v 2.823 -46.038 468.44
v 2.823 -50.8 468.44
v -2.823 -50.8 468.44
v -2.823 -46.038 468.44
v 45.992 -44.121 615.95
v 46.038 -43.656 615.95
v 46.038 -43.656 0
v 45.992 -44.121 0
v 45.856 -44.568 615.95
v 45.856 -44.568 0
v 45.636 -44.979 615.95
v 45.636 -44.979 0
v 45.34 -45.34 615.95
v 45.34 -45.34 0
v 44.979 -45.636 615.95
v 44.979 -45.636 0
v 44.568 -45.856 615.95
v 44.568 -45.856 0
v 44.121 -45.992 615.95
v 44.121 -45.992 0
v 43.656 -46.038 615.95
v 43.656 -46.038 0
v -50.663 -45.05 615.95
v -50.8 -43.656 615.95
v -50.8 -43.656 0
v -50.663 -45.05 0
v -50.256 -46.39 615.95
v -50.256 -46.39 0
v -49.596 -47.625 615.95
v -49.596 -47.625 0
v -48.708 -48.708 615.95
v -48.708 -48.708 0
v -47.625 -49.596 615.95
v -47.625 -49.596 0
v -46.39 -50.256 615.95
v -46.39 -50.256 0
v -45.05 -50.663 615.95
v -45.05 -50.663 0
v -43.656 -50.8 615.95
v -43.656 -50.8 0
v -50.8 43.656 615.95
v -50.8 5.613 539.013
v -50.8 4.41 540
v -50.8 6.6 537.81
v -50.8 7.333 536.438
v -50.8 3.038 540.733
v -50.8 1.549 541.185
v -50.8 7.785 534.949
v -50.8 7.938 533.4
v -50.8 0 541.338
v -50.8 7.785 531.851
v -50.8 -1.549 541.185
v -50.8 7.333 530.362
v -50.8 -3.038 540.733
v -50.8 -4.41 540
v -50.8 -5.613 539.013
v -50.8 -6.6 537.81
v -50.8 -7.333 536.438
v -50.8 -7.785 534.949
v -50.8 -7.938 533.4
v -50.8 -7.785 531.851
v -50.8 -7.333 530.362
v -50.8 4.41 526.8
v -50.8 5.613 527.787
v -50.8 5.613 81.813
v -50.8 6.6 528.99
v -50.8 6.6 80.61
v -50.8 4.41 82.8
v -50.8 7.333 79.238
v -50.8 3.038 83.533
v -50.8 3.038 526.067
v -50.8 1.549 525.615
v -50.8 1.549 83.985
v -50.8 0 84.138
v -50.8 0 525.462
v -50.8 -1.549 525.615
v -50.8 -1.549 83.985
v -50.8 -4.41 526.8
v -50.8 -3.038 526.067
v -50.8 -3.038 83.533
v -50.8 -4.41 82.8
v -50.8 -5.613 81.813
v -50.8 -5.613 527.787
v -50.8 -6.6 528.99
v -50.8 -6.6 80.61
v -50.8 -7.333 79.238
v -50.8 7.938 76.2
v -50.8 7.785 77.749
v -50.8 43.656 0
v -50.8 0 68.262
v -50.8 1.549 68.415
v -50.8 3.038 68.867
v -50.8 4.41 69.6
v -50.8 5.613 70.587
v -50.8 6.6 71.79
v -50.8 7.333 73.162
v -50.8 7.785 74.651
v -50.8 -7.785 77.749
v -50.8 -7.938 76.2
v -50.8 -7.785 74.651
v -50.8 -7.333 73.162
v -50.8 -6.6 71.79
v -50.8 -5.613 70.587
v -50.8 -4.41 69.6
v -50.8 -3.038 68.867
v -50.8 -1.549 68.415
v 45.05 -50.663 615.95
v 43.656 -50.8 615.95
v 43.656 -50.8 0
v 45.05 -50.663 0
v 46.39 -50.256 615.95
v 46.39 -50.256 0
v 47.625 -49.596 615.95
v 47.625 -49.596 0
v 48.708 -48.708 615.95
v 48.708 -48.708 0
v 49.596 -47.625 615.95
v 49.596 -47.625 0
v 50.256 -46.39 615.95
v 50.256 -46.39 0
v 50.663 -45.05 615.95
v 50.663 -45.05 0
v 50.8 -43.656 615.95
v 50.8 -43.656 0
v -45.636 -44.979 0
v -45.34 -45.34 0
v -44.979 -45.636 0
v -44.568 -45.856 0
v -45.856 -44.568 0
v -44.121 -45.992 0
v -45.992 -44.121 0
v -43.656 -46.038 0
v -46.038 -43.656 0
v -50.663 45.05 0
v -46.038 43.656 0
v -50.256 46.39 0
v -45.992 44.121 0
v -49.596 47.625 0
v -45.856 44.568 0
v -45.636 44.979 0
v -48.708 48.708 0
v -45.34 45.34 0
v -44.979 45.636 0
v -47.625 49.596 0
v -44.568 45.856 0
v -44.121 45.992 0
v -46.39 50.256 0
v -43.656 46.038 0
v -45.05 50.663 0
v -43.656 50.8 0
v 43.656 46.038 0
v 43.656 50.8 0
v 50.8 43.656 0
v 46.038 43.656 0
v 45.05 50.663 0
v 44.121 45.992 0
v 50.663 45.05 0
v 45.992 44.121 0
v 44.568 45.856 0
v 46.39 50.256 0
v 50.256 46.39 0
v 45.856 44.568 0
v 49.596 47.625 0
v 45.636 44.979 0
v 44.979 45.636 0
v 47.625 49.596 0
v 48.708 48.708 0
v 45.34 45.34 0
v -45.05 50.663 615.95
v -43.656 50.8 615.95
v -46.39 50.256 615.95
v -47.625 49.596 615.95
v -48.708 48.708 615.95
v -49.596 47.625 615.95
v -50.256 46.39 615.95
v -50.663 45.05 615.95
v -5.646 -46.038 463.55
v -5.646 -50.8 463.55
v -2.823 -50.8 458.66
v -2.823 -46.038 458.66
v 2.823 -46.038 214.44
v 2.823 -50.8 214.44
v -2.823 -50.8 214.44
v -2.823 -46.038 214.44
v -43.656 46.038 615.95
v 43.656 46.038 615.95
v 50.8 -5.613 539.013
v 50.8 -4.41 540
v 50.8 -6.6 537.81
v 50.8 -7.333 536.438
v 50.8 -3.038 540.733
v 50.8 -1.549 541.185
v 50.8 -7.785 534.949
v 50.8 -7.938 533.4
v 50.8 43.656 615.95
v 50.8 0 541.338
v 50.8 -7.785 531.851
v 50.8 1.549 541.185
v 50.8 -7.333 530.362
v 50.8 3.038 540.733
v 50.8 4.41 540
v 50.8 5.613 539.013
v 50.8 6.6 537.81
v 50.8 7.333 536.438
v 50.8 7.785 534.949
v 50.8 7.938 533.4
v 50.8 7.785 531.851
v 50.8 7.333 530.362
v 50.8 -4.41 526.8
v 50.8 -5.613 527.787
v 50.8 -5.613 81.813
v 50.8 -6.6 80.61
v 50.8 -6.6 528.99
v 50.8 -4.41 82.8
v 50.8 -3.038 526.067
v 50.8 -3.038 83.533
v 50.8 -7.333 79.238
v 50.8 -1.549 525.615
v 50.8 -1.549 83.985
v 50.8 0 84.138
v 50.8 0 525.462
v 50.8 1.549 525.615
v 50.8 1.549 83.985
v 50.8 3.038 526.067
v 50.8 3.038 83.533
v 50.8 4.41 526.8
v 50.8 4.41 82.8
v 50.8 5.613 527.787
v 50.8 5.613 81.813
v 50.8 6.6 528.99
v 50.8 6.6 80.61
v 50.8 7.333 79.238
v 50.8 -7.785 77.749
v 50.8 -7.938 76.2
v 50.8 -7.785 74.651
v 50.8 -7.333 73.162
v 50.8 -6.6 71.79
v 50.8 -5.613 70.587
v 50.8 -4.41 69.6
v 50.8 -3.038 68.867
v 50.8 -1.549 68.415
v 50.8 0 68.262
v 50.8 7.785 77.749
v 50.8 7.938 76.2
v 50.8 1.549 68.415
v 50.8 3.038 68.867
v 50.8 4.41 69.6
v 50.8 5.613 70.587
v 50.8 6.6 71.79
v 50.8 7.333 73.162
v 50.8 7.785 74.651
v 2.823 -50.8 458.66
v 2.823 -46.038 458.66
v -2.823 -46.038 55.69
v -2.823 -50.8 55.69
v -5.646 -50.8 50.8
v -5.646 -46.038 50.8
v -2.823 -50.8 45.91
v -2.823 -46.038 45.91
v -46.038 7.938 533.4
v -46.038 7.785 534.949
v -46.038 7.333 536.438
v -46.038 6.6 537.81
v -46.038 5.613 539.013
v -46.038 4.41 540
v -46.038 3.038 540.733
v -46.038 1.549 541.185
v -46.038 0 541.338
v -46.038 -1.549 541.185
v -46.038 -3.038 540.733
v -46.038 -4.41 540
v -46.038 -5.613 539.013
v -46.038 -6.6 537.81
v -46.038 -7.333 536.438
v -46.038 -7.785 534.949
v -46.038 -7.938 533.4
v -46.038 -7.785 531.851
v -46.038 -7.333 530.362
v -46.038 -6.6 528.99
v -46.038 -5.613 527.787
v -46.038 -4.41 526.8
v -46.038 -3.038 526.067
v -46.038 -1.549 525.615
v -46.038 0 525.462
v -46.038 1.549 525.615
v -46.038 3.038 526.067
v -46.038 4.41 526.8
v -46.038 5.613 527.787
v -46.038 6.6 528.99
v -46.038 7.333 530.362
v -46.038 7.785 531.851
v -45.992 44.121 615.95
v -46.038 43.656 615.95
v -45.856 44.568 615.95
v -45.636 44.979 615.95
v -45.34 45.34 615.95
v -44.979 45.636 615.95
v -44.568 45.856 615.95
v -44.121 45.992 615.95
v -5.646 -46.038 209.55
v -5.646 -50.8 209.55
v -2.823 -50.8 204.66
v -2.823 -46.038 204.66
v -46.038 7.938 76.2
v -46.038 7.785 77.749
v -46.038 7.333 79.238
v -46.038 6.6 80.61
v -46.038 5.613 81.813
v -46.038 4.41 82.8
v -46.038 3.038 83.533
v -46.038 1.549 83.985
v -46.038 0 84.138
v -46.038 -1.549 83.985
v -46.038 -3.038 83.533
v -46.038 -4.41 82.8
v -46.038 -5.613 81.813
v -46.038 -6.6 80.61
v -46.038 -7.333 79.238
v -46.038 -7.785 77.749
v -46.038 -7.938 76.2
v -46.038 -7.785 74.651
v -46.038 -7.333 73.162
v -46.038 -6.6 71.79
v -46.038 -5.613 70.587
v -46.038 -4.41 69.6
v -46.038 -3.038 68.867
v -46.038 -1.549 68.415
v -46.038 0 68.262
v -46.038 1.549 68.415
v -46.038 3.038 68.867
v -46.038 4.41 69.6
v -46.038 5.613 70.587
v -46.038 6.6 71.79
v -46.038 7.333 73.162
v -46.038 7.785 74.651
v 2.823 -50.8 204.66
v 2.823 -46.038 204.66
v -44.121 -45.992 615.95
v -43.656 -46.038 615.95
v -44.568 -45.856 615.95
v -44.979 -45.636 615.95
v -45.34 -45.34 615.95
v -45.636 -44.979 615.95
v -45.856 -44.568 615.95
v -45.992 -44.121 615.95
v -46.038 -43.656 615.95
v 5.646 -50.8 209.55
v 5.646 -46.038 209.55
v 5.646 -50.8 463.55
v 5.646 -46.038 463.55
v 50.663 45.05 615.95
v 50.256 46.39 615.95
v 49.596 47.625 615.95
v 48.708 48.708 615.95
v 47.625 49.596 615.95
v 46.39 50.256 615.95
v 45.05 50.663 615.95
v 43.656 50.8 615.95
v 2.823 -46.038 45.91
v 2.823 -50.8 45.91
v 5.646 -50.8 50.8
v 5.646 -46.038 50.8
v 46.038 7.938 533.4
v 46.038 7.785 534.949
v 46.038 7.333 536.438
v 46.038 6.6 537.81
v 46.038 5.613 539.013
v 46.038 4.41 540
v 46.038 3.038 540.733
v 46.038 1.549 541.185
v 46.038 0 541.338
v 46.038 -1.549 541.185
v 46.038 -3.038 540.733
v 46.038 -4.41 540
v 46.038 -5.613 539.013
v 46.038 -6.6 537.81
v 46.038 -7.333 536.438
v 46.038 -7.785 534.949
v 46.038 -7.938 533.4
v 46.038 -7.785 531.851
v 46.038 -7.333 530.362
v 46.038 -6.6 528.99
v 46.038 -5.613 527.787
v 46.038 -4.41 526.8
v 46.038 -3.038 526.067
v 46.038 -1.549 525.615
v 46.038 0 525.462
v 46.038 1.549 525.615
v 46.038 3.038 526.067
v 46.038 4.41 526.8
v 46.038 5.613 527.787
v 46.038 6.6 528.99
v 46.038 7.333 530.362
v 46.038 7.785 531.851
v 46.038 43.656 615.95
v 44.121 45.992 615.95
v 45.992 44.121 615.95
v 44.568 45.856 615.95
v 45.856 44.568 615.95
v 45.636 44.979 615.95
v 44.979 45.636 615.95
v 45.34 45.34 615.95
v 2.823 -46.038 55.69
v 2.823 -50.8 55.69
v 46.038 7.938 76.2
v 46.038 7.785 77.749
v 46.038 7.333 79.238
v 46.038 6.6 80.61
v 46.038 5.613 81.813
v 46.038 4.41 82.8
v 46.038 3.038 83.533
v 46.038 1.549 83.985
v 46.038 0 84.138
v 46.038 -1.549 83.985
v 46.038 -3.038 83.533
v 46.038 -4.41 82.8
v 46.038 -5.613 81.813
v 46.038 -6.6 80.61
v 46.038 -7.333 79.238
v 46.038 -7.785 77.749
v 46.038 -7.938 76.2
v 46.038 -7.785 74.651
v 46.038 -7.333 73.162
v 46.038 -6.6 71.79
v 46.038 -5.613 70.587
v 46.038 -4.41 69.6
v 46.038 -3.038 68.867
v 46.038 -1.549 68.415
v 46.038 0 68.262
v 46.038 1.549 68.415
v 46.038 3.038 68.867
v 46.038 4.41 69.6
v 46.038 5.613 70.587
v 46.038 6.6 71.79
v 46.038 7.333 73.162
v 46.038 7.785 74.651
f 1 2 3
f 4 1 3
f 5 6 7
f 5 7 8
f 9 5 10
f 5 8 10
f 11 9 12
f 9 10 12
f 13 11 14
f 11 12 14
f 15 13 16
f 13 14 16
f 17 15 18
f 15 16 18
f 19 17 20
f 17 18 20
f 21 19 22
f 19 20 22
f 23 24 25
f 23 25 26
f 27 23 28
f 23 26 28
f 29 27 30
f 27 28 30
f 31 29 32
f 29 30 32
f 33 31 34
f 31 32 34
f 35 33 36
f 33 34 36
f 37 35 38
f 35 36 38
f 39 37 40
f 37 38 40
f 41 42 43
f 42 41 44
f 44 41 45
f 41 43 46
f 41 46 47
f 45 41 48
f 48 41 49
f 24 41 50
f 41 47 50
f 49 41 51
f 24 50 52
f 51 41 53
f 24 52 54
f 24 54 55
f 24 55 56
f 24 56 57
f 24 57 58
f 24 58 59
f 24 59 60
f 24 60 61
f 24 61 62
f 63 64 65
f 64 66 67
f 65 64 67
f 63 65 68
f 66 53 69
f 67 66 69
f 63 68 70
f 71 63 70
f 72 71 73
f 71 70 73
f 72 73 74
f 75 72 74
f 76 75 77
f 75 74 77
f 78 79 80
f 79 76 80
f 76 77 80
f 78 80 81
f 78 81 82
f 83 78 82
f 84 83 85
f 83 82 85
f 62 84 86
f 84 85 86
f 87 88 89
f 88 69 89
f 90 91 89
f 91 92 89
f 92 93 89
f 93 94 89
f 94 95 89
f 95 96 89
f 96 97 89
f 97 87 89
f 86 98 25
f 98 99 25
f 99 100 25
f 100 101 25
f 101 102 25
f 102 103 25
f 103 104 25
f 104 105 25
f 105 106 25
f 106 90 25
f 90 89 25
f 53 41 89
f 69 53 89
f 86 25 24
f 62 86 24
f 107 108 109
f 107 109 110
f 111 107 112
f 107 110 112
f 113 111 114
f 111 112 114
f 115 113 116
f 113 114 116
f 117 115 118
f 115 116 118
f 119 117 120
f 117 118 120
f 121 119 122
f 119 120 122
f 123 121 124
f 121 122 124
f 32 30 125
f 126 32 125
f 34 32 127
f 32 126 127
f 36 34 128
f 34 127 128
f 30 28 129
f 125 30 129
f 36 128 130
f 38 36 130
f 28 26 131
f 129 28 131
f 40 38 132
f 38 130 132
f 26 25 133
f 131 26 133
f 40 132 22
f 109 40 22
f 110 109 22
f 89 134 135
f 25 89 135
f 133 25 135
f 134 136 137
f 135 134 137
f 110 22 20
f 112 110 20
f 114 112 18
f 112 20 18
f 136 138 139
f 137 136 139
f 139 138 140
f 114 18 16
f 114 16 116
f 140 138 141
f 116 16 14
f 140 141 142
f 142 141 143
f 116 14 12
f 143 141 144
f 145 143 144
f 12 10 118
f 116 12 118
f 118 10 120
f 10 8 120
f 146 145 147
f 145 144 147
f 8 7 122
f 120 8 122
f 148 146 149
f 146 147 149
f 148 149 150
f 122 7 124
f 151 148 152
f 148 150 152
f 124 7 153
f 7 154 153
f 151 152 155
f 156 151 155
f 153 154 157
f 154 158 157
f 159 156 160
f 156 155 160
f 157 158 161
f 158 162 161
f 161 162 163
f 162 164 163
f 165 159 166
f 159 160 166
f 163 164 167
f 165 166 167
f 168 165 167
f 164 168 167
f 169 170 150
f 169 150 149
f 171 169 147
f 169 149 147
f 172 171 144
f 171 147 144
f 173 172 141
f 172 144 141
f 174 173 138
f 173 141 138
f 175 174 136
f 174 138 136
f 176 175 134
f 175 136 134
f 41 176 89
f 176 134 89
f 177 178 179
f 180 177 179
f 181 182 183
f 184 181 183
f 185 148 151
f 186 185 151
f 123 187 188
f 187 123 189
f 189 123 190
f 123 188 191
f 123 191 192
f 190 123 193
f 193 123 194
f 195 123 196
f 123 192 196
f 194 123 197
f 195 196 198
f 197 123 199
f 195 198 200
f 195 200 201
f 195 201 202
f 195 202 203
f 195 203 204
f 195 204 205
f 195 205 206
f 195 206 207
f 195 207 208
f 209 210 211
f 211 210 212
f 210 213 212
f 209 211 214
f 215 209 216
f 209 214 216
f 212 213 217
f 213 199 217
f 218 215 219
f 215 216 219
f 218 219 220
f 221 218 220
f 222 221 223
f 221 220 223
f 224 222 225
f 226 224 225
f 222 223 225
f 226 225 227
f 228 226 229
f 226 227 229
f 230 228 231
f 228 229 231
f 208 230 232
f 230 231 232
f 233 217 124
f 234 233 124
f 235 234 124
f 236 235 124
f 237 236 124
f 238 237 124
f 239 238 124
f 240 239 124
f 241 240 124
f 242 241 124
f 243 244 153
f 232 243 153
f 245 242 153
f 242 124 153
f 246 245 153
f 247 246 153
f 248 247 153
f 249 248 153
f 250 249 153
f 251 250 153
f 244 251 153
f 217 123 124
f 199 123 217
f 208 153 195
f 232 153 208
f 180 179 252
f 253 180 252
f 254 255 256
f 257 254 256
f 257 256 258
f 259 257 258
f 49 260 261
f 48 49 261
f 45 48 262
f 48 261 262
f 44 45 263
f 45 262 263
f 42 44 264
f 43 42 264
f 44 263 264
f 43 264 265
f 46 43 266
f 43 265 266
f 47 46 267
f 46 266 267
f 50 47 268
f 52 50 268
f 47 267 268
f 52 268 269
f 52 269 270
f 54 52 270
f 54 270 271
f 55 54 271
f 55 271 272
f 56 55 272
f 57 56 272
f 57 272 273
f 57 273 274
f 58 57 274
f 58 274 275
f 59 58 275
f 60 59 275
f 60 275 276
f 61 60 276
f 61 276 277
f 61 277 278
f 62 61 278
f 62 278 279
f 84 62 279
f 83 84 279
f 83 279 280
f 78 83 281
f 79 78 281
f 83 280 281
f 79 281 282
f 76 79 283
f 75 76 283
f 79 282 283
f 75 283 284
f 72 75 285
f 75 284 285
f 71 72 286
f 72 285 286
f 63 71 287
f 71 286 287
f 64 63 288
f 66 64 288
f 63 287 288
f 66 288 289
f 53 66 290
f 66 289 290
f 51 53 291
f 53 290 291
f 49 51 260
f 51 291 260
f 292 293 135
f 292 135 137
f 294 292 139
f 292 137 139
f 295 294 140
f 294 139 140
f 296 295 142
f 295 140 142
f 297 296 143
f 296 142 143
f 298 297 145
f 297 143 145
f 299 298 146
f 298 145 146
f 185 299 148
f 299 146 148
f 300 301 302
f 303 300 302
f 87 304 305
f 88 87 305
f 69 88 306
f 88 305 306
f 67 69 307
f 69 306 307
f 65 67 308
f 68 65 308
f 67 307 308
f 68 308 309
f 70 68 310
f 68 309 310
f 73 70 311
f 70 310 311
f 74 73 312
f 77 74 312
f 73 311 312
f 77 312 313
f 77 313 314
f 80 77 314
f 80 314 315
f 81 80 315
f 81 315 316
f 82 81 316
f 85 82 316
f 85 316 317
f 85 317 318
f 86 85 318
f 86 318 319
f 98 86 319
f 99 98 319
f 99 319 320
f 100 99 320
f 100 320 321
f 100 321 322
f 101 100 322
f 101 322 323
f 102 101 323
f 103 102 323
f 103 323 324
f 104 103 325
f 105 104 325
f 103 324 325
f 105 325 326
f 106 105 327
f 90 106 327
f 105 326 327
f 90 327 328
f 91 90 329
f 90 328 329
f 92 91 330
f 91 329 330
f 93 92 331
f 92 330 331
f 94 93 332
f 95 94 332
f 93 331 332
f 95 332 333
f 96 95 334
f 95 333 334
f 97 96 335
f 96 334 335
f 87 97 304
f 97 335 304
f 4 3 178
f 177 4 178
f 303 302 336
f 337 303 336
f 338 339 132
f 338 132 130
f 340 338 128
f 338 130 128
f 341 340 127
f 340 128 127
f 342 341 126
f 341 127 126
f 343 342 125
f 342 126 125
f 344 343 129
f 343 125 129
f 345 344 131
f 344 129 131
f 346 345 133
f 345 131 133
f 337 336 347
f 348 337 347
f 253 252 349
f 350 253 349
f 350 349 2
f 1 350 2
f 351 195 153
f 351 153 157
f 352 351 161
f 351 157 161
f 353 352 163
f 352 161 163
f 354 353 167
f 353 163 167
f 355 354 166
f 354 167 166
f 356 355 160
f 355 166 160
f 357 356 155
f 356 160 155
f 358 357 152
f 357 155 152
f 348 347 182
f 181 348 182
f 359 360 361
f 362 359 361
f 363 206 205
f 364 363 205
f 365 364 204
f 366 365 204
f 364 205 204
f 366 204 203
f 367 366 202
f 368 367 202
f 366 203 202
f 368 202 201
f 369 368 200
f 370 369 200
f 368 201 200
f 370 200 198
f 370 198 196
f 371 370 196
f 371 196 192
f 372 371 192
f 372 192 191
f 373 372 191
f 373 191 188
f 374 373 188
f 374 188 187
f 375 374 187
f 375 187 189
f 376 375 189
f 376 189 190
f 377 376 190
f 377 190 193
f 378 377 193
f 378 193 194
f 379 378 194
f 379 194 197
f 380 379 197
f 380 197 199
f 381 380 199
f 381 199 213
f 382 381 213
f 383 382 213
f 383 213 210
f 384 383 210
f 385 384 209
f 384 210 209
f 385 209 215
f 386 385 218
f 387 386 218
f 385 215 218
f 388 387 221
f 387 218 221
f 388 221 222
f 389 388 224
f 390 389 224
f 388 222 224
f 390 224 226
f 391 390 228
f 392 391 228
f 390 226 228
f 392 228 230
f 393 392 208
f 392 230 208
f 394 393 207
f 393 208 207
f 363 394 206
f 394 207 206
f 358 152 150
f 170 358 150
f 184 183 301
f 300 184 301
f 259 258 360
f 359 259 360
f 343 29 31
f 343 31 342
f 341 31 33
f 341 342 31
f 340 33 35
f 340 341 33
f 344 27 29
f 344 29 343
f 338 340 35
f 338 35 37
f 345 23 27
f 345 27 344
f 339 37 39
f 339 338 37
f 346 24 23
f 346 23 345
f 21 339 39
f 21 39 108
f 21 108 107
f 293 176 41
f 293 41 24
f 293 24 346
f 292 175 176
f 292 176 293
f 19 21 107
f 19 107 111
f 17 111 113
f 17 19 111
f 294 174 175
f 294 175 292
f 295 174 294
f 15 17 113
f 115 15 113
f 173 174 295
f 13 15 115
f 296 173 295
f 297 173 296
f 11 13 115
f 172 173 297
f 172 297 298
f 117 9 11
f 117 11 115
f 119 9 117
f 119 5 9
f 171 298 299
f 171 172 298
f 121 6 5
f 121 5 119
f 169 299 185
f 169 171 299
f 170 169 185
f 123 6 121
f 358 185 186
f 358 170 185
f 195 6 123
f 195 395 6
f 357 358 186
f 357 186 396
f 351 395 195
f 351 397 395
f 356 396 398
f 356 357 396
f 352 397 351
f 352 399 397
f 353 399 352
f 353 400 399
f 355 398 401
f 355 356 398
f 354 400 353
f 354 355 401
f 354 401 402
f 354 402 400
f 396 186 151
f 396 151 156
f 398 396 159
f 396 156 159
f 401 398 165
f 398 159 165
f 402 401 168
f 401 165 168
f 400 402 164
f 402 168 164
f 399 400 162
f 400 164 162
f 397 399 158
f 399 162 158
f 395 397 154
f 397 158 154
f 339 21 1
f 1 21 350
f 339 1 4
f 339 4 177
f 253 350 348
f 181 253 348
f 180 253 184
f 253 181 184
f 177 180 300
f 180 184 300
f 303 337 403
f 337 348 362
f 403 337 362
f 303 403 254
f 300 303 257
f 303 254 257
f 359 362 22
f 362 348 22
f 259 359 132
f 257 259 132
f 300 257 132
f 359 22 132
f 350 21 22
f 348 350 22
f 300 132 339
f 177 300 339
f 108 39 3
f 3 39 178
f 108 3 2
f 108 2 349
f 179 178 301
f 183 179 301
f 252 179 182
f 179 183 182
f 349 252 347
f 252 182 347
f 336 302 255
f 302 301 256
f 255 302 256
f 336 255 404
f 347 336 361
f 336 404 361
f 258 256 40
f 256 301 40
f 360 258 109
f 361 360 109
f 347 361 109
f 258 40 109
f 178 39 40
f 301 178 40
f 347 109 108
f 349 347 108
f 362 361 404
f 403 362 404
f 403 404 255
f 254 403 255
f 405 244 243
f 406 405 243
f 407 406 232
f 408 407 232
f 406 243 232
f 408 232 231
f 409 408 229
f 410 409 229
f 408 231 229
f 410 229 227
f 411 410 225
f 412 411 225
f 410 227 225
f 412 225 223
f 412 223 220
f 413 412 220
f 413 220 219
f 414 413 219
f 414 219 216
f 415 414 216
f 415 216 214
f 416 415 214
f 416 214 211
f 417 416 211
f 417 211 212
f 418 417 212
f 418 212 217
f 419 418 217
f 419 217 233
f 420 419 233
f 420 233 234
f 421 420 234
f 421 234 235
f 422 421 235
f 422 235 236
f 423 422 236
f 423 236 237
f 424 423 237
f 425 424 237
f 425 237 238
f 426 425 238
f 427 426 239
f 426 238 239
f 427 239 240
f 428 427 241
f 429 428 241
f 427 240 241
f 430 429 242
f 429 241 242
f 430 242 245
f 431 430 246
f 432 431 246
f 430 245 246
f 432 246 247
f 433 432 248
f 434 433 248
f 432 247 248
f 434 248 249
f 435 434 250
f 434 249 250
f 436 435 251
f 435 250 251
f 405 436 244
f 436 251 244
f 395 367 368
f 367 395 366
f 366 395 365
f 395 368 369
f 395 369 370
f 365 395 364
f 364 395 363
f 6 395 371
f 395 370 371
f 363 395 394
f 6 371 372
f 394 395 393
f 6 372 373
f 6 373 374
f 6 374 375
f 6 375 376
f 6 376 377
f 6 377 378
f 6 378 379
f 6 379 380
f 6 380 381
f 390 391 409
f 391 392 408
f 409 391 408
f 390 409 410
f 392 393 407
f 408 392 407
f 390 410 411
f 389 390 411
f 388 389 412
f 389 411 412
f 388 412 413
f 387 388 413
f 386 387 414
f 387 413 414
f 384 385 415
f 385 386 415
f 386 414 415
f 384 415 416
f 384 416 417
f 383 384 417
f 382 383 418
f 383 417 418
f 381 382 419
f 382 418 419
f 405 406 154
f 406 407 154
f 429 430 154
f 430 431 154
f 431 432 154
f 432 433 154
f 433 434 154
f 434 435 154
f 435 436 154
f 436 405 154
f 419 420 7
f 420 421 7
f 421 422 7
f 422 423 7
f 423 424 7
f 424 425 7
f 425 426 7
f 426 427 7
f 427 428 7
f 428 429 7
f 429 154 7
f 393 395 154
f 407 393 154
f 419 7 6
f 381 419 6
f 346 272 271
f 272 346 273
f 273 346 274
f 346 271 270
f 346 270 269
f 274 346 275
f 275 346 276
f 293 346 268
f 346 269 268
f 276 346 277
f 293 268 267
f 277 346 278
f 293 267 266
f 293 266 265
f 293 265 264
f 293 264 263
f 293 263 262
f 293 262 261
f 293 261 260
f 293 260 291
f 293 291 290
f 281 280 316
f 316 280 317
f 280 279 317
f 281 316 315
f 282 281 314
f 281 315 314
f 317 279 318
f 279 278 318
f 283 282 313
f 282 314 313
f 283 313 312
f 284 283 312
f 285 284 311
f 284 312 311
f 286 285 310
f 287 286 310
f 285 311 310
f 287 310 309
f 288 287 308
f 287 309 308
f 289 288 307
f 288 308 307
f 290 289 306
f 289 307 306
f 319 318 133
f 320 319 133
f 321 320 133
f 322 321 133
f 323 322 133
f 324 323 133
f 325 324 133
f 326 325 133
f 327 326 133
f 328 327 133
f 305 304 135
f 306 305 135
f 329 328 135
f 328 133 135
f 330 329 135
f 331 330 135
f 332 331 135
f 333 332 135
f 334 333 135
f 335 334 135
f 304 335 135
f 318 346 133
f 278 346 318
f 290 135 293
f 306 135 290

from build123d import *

# Parameters (mm, degrees)
F1_DEPTH = 615.95
F3_DEPTH = 25.4
F4_R     = 7.9375
F5_DEPTH = 101.601


with BuildPart() as f1:
    # F0 (on Top) → F1 (new body)
    with BuildSketch(Plane.XY):
        with BuildLine():
            Line((43.65625, 50.8), (-43.65625, 50.8))
            ThreePointArc((-43.65625, 50.8), (-48.707644, 48.707644), (-50.8, 43.65625))
            Line((-50.8, 43.65625), (-50.8, -43.65625))
            ThreePointArc((-50.8, -43.65625), (-48.707644, -48.707644), (-43.65625, -50.8))
            Line((-43.65625, -50.8), (43.65625, -50.8))
            ThreePointArc((43.65625, -50.8), (48.707644, -48.707644), (50.8, -43.65625))
            Line((50.8, -43.65625), (50.8, 43.65625))
            ThreePointArc((50.8, 43.65625), (48.707644, 48.707644), (43.65625, 50.8))
        make_face()
        with BuildLine():
            Line((43.65625, -46.0375), (-43.65625, -46.0375))
            ThreePointArc((-43.65625, -46.0375), (-45.340048, -45.340048), (-46.0375, -43.65625))
            Line((-46.0375, -43.65625), (-46.0375, 43.65625))
            ThreePointArc((-46.0375, 43.65625), (-45.340048, 45.340048), (-43.65625, 46.0375))
            Line((-43.65625, 46.0375), (43.65625, 46.0375))
            ThreePointArc((43.65625, 46.0375), (45.340048, 45.340048), (46.0375, 43.65625))
            Line((46.0375, 43.65625), (46.0375, -43.65625))
            ThreePointArc((46.0375, -43.65625), (45.340048, -45.340048), (43.65625, -46.0375))
        make_face(mode=Mode.SUBTRACT)
    extrude(amount=F1_DEPTH)

    # F2 (on face) → F3 (cut)
    with BuildSketch(Plane.XZ.offset(50.8)):
        Polygon((-2.822954, 45.9105), (2.822954, 45.9105), (5.645908, 50.8), (2.822954, 55.6895), (-2.822954, 55.6895), (-5.645908, 50.8), align=None)
        Polygon((-2.822954, 204.6605), (2.822954, 204.6605), (5.645908, 209.55), (2.822954, 214.4395), (-2.822954, 214.4395), (-5.645908, 209.55), align=None)
        Polygon((-2.822954, 458.6605), (2.822954, 458.6605), (5.645908, 463.55), (2.822954, 468.4395), (-2.822954, 468.4395), (-5.645908, 463.55), align=None)
    extrude(amount=-F3_DEPTH, mode=Mode.SUBTRACT)

    # F4 (on face) → F5 (cut, through all)
    with BuildSketch(Plane.YZ.offset(50.8)):
        with Locations((0, 76.2)):
            Circle(F4_R)
        with Locations((0, 533.4)):
            Circle(F4_R)
    extrude(amount=-F5_DEPTH, mode=Mode.SUBTRACT)


solid = f1.part
